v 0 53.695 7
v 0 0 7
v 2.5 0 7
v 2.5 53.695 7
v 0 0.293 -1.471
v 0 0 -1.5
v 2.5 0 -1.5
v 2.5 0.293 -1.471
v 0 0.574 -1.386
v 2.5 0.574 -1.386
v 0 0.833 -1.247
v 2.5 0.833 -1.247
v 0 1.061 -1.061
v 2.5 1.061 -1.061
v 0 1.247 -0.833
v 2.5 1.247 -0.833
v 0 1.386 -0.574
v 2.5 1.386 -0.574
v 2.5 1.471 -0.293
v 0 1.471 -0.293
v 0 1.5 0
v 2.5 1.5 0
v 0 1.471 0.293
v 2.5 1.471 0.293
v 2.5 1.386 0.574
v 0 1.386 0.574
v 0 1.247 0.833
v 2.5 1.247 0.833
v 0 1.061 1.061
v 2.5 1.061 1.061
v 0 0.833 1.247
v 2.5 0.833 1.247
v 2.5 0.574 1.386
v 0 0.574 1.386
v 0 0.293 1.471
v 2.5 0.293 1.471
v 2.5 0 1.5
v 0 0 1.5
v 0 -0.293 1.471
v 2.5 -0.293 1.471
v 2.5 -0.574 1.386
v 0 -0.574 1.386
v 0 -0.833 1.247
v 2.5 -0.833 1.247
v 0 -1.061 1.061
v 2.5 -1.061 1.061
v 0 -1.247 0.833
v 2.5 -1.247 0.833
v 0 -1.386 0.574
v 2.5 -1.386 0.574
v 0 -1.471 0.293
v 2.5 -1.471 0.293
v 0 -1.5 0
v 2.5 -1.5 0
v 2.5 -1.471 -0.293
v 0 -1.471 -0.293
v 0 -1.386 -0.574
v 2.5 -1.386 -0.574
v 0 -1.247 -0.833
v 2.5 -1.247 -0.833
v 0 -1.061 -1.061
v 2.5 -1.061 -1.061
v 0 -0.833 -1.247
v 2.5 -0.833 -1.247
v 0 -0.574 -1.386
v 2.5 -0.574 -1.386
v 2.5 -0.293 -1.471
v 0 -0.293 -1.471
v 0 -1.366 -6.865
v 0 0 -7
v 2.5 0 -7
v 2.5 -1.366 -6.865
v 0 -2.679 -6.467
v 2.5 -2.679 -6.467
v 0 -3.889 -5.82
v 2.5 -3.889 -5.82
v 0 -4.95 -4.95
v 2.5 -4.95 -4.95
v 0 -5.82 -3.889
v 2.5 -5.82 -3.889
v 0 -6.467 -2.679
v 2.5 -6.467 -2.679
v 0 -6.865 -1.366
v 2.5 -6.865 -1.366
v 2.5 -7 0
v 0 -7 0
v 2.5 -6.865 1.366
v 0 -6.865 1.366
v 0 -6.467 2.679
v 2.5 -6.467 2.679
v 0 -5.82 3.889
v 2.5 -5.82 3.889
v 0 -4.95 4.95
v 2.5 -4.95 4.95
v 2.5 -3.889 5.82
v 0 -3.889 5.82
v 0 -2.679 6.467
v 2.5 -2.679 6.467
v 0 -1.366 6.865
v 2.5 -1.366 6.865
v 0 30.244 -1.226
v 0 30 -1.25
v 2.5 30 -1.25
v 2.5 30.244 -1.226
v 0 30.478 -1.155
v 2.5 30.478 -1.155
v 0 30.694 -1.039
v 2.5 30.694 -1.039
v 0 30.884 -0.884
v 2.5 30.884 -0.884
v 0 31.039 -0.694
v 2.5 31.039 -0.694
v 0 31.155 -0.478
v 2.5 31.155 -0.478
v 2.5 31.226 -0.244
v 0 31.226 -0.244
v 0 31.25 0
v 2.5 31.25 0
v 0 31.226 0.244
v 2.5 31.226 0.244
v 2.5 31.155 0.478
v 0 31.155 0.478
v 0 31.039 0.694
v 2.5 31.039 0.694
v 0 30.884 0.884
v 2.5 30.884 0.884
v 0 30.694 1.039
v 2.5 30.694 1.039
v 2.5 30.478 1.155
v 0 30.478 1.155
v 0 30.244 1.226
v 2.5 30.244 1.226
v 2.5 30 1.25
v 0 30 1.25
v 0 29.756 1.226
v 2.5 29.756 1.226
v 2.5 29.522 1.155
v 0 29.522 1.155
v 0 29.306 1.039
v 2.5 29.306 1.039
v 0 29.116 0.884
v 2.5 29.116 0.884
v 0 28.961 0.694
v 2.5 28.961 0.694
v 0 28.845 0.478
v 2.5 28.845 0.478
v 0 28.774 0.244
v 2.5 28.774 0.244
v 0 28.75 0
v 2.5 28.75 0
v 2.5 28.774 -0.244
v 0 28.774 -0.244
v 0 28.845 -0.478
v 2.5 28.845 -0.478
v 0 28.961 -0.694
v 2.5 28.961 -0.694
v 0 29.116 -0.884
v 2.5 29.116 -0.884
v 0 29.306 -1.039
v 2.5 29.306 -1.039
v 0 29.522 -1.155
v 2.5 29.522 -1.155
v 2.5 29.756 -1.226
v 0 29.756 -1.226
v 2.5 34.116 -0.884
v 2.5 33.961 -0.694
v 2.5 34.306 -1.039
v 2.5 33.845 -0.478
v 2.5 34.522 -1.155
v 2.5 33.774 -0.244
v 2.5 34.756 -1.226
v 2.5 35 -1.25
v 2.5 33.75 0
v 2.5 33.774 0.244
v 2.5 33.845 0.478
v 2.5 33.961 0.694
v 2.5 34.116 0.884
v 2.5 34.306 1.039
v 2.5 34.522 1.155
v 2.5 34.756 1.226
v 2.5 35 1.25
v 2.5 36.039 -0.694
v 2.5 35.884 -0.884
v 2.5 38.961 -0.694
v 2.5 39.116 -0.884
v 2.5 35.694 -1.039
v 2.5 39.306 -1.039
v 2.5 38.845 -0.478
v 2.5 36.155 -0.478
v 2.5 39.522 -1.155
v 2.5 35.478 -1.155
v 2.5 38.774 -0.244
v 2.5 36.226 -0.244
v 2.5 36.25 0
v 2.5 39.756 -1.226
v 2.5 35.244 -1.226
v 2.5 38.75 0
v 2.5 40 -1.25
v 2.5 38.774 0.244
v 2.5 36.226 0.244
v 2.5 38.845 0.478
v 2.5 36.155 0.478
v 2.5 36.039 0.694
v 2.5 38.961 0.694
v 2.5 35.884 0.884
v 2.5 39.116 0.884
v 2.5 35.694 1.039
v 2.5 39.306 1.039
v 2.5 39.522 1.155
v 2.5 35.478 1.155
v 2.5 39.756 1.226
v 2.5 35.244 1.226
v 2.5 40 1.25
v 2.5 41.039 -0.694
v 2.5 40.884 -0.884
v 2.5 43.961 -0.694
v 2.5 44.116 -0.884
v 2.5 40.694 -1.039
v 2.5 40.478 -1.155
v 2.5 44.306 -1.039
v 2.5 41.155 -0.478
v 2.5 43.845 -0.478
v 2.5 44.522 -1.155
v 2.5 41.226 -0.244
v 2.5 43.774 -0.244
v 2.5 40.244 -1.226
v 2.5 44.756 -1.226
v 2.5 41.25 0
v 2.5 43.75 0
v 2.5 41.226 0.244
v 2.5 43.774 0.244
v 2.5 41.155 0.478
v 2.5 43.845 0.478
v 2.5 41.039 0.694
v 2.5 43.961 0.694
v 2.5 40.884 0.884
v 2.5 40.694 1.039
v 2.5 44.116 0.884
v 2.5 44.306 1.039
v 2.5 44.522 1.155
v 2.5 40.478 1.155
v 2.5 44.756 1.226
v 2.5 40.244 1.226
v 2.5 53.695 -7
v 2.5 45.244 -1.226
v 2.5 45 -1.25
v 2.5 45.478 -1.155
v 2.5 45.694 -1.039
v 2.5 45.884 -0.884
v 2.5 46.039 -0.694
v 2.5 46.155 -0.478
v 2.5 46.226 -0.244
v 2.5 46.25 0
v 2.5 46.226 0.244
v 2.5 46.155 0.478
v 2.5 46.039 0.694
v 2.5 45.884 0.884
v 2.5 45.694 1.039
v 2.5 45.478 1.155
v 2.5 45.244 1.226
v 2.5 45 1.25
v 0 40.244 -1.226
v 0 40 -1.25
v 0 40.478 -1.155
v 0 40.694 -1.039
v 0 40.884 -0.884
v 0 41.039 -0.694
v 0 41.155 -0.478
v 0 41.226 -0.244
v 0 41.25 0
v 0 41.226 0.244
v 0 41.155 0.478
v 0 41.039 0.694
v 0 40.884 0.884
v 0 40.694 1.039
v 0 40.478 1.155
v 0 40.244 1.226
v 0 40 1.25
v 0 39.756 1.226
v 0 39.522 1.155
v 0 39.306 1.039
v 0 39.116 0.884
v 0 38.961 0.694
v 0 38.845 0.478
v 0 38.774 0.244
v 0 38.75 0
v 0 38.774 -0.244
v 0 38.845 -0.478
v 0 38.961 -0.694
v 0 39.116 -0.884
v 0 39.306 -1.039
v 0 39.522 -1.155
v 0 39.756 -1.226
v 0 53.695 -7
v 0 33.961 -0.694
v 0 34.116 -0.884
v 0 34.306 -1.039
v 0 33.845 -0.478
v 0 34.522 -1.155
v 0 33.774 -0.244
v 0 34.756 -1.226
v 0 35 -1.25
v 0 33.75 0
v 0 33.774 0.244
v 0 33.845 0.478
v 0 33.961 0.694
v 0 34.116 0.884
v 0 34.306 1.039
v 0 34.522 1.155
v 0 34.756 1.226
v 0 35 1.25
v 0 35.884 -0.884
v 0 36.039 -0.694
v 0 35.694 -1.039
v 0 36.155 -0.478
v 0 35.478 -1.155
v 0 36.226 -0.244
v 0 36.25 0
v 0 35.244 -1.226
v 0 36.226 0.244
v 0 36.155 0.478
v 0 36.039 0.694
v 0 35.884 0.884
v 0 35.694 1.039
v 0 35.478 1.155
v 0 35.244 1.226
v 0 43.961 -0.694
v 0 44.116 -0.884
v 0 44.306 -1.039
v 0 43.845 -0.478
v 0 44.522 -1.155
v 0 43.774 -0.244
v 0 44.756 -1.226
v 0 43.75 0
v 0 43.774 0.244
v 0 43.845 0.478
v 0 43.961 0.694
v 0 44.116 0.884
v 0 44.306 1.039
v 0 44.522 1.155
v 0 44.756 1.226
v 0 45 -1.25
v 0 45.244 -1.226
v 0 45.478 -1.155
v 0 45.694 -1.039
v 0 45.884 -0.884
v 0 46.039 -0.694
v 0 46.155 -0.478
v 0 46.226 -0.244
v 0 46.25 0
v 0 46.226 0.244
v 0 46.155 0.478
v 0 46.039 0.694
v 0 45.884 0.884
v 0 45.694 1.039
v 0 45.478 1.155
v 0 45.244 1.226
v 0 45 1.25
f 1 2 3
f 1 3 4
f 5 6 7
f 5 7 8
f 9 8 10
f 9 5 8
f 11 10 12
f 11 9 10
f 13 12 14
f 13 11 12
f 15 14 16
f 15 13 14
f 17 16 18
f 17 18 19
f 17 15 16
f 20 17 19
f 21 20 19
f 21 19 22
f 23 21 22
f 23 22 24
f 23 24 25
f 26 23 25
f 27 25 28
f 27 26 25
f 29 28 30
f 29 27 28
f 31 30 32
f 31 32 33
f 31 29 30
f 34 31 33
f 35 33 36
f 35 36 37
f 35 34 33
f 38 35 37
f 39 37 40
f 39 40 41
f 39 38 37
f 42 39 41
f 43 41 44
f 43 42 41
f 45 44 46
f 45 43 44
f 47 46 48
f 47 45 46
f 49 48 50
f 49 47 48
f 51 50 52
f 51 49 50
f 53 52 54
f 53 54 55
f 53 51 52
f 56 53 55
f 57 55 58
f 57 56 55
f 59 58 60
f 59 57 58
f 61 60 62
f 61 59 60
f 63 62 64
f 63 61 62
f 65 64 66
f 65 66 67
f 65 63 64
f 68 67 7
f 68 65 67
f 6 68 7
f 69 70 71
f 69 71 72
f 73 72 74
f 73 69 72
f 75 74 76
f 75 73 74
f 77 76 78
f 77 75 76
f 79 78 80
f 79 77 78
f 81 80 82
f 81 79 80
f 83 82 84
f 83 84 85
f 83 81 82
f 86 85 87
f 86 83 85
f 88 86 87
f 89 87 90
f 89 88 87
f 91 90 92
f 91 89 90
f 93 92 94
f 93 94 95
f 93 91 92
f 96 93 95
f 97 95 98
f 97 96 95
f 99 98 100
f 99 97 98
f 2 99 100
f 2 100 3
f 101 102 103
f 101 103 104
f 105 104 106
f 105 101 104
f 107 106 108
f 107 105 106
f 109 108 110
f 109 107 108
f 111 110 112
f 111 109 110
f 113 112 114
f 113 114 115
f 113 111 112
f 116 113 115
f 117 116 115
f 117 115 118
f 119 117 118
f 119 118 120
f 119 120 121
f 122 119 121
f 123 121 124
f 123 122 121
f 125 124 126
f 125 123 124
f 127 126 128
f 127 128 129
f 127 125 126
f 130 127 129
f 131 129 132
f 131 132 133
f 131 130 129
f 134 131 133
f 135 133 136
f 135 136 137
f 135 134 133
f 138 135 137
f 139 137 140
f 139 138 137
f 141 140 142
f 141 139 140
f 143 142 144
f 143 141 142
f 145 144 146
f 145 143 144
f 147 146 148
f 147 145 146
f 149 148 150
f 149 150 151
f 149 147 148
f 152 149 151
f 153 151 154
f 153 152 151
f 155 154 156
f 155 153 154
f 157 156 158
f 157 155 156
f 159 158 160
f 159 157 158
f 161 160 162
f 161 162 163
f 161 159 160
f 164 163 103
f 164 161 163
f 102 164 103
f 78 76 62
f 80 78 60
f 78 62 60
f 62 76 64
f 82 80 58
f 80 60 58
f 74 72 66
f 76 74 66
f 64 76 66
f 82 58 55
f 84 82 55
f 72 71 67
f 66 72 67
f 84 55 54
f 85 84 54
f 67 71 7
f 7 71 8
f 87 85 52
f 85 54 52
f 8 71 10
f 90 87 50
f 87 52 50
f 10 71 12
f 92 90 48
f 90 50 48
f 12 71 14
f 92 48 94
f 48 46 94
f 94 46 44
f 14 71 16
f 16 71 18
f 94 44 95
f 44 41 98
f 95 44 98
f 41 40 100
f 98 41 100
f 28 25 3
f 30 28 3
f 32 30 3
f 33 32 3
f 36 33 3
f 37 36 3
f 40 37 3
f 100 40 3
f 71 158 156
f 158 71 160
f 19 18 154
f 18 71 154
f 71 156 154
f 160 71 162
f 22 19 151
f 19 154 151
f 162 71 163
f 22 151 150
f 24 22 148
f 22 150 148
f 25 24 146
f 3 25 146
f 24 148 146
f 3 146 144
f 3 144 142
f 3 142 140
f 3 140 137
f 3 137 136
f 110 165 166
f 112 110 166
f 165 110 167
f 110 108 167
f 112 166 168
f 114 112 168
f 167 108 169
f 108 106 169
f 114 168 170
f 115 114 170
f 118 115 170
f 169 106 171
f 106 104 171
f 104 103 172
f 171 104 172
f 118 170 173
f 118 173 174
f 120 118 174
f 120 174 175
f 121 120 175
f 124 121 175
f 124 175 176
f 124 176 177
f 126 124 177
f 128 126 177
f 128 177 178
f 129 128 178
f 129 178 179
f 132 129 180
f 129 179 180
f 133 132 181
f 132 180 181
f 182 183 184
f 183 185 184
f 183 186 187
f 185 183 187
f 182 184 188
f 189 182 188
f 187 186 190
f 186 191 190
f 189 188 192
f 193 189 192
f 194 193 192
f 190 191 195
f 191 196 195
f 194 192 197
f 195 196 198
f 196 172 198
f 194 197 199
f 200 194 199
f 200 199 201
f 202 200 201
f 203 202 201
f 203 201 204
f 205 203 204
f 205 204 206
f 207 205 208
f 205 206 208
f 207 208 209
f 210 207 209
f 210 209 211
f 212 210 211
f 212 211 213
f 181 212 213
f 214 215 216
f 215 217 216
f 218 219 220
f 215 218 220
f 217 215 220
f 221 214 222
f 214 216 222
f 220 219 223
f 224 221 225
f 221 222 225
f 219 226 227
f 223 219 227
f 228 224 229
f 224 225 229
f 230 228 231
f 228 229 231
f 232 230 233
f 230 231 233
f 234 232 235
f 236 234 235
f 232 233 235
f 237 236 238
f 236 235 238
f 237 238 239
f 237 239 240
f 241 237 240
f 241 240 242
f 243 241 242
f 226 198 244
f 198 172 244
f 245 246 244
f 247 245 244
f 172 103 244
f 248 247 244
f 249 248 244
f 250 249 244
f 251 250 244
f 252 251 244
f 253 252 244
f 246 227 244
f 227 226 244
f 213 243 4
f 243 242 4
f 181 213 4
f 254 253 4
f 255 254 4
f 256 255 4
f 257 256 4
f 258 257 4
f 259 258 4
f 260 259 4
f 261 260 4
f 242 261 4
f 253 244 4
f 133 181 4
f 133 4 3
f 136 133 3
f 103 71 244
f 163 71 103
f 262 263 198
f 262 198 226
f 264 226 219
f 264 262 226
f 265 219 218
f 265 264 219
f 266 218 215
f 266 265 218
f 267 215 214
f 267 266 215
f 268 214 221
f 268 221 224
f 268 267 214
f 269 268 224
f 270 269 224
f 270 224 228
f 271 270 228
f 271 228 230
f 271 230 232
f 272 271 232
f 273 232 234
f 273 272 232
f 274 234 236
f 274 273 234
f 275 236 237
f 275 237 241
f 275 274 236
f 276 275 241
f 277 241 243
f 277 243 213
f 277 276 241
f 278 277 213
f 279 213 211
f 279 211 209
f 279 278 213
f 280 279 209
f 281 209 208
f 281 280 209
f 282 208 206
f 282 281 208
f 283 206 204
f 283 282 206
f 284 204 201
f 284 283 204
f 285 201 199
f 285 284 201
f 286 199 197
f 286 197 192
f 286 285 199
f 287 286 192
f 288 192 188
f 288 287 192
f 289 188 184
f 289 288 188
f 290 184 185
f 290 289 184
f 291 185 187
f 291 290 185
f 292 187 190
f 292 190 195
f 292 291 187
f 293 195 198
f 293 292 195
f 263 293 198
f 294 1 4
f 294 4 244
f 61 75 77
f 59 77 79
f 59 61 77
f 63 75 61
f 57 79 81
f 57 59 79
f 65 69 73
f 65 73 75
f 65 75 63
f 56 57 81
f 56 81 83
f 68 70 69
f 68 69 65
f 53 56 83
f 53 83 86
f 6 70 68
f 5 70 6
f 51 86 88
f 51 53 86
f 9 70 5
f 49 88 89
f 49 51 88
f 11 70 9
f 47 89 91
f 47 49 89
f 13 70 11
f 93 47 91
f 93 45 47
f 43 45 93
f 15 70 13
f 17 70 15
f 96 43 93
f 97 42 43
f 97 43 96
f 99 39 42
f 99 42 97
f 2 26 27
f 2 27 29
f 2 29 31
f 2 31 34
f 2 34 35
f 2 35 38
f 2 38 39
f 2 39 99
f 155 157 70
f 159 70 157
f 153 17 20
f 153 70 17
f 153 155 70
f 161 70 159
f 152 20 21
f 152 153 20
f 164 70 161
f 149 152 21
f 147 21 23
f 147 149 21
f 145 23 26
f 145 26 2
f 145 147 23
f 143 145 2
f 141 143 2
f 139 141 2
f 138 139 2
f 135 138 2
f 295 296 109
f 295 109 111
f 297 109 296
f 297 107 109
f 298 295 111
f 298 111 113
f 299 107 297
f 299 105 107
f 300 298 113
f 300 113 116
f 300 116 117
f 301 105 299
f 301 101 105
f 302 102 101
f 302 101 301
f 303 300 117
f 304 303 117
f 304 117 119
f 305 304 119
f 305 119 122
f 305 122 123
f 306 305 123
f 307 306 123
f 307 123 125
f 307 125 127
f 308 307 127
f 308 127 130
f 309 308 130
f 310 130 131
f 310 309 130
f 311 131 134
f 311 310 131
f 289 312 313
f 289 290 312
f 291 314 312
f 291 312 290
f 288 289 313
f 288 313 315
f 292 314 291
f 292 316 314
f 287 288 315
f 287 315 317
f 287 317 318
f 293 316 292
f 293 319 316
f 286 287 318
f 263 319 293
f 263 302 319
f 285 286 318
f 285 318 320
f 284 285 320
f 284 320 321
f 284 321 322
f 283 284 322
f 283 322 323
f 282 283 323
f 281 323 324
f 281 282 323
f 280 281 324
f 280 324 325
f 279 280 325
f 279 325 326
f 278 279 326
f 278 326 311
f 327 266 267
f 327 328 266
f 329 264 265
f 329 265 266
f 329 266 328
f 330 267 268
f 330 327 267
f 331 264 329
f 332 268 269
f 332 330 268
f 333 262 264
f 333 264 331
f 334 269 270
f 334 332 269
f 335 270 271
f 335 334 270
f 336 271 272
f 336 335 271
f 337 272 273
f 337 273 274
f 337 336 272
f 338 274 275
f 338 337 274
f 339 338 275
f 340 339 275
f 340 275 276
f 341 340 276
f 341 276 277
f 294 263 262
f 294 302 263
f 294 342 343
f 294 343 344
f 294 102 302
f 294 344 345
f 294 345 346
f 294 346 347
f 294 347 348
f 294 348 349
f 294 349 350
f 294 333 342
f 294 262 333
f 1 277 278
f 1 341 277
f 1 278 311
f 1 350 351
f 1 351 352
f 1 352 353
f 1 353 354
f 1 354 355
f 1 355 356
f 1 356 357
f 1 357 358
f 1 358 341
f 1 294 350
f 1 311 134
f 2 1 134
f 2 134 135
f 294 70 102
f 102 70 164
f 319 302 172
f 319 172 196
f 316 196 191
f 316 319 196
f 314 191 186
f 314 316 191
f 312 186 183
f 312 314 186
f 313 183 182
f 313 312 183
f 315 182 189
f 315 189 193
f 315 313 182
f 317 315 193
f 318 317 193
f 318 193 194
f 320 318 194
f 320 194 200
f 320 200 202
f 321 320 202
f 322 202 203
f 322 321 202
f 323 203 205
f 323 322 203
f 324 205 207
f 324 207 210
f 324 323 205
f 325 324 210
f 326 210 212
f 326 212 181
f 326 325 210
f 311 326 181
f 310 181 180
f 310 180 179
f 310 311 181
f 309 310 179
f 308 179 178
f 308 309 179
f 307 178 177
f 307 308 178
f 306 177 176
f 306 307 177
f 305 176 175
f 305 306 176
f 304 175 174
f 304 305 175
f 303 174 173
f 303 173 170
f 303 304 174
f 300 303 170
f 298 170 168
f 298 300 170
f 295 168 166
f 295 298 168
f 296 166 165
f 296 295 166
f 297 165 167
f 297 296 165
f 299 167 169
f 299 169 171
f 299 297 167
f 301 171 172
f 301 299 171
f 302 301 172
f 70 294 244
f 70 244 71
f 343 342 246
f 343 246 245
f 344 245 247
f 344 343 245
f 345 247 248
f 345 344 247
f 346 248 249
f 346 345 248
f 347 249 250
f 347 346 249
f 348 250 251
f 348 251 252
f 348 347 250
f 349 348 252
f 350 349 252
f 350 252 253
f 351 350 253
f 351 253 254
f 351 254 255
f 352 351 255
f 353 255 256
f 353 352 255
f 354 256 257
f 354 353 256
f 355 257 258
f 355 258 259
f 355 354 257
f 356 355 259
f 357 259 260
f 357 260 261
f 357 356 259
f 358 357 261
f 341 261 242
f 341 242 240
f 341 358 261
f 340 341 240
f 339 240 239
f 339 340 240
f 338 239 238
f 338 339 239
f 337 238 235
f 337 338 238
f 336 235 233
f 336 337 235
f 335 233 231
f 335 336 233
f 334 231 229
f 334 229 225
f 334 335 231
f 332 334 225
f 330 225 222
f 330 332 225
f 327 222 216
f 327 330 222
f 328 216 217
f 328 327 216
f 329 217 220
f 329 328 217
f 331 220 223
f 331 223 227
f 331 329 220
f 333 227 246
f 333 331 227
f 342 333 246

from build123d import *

# Parameters (mm, degrees)
SKETCH1_R           = 1.5
SKETCH1_R_2         = 1.25
BOSS_EXTRUDE1_DEPTH = 2.5


with BuildPart() as part:
    # Sketch1 → Boss-Extrude1 (new body)
    with BuildSketch(Plane(origin=(0, 0, 0), x_dir=(0, 0, -1), z_dir=(1, 0, 0))):
        with BuildLine():
            Line((-7, 0), (-7, 53.695339599))
            Line((-7, 53.695339599), (7, 53.695339599))
            Line((7, 53.695339599), (7, 0))
            ThreePointArc((7, 0), (0, -7), (-7, 0))
        make_face()
        Circle(SKETCH1_R, mode=Mode.SUBTRACT)
        with Locations((0, 45)):
            Circle(SKETCH1_R_2, mode=Mode.SUBTRACT)
        with Locations((0, 40)):
            Circle(SKETCH1_R_2, mode=Mode.SUBTRACT)
        with Locations((0, 35)):
            Circle(SKETCH1_R_2, mode=Mode.SUBTRACT)
        with Locations((0, 30)):
            Circle(SKETCH1_R_2, mode=Mode.SUBTRACT)
    extrude(amount=BOSS_EXTRUDE1_DEPTH)


solid = part.part
